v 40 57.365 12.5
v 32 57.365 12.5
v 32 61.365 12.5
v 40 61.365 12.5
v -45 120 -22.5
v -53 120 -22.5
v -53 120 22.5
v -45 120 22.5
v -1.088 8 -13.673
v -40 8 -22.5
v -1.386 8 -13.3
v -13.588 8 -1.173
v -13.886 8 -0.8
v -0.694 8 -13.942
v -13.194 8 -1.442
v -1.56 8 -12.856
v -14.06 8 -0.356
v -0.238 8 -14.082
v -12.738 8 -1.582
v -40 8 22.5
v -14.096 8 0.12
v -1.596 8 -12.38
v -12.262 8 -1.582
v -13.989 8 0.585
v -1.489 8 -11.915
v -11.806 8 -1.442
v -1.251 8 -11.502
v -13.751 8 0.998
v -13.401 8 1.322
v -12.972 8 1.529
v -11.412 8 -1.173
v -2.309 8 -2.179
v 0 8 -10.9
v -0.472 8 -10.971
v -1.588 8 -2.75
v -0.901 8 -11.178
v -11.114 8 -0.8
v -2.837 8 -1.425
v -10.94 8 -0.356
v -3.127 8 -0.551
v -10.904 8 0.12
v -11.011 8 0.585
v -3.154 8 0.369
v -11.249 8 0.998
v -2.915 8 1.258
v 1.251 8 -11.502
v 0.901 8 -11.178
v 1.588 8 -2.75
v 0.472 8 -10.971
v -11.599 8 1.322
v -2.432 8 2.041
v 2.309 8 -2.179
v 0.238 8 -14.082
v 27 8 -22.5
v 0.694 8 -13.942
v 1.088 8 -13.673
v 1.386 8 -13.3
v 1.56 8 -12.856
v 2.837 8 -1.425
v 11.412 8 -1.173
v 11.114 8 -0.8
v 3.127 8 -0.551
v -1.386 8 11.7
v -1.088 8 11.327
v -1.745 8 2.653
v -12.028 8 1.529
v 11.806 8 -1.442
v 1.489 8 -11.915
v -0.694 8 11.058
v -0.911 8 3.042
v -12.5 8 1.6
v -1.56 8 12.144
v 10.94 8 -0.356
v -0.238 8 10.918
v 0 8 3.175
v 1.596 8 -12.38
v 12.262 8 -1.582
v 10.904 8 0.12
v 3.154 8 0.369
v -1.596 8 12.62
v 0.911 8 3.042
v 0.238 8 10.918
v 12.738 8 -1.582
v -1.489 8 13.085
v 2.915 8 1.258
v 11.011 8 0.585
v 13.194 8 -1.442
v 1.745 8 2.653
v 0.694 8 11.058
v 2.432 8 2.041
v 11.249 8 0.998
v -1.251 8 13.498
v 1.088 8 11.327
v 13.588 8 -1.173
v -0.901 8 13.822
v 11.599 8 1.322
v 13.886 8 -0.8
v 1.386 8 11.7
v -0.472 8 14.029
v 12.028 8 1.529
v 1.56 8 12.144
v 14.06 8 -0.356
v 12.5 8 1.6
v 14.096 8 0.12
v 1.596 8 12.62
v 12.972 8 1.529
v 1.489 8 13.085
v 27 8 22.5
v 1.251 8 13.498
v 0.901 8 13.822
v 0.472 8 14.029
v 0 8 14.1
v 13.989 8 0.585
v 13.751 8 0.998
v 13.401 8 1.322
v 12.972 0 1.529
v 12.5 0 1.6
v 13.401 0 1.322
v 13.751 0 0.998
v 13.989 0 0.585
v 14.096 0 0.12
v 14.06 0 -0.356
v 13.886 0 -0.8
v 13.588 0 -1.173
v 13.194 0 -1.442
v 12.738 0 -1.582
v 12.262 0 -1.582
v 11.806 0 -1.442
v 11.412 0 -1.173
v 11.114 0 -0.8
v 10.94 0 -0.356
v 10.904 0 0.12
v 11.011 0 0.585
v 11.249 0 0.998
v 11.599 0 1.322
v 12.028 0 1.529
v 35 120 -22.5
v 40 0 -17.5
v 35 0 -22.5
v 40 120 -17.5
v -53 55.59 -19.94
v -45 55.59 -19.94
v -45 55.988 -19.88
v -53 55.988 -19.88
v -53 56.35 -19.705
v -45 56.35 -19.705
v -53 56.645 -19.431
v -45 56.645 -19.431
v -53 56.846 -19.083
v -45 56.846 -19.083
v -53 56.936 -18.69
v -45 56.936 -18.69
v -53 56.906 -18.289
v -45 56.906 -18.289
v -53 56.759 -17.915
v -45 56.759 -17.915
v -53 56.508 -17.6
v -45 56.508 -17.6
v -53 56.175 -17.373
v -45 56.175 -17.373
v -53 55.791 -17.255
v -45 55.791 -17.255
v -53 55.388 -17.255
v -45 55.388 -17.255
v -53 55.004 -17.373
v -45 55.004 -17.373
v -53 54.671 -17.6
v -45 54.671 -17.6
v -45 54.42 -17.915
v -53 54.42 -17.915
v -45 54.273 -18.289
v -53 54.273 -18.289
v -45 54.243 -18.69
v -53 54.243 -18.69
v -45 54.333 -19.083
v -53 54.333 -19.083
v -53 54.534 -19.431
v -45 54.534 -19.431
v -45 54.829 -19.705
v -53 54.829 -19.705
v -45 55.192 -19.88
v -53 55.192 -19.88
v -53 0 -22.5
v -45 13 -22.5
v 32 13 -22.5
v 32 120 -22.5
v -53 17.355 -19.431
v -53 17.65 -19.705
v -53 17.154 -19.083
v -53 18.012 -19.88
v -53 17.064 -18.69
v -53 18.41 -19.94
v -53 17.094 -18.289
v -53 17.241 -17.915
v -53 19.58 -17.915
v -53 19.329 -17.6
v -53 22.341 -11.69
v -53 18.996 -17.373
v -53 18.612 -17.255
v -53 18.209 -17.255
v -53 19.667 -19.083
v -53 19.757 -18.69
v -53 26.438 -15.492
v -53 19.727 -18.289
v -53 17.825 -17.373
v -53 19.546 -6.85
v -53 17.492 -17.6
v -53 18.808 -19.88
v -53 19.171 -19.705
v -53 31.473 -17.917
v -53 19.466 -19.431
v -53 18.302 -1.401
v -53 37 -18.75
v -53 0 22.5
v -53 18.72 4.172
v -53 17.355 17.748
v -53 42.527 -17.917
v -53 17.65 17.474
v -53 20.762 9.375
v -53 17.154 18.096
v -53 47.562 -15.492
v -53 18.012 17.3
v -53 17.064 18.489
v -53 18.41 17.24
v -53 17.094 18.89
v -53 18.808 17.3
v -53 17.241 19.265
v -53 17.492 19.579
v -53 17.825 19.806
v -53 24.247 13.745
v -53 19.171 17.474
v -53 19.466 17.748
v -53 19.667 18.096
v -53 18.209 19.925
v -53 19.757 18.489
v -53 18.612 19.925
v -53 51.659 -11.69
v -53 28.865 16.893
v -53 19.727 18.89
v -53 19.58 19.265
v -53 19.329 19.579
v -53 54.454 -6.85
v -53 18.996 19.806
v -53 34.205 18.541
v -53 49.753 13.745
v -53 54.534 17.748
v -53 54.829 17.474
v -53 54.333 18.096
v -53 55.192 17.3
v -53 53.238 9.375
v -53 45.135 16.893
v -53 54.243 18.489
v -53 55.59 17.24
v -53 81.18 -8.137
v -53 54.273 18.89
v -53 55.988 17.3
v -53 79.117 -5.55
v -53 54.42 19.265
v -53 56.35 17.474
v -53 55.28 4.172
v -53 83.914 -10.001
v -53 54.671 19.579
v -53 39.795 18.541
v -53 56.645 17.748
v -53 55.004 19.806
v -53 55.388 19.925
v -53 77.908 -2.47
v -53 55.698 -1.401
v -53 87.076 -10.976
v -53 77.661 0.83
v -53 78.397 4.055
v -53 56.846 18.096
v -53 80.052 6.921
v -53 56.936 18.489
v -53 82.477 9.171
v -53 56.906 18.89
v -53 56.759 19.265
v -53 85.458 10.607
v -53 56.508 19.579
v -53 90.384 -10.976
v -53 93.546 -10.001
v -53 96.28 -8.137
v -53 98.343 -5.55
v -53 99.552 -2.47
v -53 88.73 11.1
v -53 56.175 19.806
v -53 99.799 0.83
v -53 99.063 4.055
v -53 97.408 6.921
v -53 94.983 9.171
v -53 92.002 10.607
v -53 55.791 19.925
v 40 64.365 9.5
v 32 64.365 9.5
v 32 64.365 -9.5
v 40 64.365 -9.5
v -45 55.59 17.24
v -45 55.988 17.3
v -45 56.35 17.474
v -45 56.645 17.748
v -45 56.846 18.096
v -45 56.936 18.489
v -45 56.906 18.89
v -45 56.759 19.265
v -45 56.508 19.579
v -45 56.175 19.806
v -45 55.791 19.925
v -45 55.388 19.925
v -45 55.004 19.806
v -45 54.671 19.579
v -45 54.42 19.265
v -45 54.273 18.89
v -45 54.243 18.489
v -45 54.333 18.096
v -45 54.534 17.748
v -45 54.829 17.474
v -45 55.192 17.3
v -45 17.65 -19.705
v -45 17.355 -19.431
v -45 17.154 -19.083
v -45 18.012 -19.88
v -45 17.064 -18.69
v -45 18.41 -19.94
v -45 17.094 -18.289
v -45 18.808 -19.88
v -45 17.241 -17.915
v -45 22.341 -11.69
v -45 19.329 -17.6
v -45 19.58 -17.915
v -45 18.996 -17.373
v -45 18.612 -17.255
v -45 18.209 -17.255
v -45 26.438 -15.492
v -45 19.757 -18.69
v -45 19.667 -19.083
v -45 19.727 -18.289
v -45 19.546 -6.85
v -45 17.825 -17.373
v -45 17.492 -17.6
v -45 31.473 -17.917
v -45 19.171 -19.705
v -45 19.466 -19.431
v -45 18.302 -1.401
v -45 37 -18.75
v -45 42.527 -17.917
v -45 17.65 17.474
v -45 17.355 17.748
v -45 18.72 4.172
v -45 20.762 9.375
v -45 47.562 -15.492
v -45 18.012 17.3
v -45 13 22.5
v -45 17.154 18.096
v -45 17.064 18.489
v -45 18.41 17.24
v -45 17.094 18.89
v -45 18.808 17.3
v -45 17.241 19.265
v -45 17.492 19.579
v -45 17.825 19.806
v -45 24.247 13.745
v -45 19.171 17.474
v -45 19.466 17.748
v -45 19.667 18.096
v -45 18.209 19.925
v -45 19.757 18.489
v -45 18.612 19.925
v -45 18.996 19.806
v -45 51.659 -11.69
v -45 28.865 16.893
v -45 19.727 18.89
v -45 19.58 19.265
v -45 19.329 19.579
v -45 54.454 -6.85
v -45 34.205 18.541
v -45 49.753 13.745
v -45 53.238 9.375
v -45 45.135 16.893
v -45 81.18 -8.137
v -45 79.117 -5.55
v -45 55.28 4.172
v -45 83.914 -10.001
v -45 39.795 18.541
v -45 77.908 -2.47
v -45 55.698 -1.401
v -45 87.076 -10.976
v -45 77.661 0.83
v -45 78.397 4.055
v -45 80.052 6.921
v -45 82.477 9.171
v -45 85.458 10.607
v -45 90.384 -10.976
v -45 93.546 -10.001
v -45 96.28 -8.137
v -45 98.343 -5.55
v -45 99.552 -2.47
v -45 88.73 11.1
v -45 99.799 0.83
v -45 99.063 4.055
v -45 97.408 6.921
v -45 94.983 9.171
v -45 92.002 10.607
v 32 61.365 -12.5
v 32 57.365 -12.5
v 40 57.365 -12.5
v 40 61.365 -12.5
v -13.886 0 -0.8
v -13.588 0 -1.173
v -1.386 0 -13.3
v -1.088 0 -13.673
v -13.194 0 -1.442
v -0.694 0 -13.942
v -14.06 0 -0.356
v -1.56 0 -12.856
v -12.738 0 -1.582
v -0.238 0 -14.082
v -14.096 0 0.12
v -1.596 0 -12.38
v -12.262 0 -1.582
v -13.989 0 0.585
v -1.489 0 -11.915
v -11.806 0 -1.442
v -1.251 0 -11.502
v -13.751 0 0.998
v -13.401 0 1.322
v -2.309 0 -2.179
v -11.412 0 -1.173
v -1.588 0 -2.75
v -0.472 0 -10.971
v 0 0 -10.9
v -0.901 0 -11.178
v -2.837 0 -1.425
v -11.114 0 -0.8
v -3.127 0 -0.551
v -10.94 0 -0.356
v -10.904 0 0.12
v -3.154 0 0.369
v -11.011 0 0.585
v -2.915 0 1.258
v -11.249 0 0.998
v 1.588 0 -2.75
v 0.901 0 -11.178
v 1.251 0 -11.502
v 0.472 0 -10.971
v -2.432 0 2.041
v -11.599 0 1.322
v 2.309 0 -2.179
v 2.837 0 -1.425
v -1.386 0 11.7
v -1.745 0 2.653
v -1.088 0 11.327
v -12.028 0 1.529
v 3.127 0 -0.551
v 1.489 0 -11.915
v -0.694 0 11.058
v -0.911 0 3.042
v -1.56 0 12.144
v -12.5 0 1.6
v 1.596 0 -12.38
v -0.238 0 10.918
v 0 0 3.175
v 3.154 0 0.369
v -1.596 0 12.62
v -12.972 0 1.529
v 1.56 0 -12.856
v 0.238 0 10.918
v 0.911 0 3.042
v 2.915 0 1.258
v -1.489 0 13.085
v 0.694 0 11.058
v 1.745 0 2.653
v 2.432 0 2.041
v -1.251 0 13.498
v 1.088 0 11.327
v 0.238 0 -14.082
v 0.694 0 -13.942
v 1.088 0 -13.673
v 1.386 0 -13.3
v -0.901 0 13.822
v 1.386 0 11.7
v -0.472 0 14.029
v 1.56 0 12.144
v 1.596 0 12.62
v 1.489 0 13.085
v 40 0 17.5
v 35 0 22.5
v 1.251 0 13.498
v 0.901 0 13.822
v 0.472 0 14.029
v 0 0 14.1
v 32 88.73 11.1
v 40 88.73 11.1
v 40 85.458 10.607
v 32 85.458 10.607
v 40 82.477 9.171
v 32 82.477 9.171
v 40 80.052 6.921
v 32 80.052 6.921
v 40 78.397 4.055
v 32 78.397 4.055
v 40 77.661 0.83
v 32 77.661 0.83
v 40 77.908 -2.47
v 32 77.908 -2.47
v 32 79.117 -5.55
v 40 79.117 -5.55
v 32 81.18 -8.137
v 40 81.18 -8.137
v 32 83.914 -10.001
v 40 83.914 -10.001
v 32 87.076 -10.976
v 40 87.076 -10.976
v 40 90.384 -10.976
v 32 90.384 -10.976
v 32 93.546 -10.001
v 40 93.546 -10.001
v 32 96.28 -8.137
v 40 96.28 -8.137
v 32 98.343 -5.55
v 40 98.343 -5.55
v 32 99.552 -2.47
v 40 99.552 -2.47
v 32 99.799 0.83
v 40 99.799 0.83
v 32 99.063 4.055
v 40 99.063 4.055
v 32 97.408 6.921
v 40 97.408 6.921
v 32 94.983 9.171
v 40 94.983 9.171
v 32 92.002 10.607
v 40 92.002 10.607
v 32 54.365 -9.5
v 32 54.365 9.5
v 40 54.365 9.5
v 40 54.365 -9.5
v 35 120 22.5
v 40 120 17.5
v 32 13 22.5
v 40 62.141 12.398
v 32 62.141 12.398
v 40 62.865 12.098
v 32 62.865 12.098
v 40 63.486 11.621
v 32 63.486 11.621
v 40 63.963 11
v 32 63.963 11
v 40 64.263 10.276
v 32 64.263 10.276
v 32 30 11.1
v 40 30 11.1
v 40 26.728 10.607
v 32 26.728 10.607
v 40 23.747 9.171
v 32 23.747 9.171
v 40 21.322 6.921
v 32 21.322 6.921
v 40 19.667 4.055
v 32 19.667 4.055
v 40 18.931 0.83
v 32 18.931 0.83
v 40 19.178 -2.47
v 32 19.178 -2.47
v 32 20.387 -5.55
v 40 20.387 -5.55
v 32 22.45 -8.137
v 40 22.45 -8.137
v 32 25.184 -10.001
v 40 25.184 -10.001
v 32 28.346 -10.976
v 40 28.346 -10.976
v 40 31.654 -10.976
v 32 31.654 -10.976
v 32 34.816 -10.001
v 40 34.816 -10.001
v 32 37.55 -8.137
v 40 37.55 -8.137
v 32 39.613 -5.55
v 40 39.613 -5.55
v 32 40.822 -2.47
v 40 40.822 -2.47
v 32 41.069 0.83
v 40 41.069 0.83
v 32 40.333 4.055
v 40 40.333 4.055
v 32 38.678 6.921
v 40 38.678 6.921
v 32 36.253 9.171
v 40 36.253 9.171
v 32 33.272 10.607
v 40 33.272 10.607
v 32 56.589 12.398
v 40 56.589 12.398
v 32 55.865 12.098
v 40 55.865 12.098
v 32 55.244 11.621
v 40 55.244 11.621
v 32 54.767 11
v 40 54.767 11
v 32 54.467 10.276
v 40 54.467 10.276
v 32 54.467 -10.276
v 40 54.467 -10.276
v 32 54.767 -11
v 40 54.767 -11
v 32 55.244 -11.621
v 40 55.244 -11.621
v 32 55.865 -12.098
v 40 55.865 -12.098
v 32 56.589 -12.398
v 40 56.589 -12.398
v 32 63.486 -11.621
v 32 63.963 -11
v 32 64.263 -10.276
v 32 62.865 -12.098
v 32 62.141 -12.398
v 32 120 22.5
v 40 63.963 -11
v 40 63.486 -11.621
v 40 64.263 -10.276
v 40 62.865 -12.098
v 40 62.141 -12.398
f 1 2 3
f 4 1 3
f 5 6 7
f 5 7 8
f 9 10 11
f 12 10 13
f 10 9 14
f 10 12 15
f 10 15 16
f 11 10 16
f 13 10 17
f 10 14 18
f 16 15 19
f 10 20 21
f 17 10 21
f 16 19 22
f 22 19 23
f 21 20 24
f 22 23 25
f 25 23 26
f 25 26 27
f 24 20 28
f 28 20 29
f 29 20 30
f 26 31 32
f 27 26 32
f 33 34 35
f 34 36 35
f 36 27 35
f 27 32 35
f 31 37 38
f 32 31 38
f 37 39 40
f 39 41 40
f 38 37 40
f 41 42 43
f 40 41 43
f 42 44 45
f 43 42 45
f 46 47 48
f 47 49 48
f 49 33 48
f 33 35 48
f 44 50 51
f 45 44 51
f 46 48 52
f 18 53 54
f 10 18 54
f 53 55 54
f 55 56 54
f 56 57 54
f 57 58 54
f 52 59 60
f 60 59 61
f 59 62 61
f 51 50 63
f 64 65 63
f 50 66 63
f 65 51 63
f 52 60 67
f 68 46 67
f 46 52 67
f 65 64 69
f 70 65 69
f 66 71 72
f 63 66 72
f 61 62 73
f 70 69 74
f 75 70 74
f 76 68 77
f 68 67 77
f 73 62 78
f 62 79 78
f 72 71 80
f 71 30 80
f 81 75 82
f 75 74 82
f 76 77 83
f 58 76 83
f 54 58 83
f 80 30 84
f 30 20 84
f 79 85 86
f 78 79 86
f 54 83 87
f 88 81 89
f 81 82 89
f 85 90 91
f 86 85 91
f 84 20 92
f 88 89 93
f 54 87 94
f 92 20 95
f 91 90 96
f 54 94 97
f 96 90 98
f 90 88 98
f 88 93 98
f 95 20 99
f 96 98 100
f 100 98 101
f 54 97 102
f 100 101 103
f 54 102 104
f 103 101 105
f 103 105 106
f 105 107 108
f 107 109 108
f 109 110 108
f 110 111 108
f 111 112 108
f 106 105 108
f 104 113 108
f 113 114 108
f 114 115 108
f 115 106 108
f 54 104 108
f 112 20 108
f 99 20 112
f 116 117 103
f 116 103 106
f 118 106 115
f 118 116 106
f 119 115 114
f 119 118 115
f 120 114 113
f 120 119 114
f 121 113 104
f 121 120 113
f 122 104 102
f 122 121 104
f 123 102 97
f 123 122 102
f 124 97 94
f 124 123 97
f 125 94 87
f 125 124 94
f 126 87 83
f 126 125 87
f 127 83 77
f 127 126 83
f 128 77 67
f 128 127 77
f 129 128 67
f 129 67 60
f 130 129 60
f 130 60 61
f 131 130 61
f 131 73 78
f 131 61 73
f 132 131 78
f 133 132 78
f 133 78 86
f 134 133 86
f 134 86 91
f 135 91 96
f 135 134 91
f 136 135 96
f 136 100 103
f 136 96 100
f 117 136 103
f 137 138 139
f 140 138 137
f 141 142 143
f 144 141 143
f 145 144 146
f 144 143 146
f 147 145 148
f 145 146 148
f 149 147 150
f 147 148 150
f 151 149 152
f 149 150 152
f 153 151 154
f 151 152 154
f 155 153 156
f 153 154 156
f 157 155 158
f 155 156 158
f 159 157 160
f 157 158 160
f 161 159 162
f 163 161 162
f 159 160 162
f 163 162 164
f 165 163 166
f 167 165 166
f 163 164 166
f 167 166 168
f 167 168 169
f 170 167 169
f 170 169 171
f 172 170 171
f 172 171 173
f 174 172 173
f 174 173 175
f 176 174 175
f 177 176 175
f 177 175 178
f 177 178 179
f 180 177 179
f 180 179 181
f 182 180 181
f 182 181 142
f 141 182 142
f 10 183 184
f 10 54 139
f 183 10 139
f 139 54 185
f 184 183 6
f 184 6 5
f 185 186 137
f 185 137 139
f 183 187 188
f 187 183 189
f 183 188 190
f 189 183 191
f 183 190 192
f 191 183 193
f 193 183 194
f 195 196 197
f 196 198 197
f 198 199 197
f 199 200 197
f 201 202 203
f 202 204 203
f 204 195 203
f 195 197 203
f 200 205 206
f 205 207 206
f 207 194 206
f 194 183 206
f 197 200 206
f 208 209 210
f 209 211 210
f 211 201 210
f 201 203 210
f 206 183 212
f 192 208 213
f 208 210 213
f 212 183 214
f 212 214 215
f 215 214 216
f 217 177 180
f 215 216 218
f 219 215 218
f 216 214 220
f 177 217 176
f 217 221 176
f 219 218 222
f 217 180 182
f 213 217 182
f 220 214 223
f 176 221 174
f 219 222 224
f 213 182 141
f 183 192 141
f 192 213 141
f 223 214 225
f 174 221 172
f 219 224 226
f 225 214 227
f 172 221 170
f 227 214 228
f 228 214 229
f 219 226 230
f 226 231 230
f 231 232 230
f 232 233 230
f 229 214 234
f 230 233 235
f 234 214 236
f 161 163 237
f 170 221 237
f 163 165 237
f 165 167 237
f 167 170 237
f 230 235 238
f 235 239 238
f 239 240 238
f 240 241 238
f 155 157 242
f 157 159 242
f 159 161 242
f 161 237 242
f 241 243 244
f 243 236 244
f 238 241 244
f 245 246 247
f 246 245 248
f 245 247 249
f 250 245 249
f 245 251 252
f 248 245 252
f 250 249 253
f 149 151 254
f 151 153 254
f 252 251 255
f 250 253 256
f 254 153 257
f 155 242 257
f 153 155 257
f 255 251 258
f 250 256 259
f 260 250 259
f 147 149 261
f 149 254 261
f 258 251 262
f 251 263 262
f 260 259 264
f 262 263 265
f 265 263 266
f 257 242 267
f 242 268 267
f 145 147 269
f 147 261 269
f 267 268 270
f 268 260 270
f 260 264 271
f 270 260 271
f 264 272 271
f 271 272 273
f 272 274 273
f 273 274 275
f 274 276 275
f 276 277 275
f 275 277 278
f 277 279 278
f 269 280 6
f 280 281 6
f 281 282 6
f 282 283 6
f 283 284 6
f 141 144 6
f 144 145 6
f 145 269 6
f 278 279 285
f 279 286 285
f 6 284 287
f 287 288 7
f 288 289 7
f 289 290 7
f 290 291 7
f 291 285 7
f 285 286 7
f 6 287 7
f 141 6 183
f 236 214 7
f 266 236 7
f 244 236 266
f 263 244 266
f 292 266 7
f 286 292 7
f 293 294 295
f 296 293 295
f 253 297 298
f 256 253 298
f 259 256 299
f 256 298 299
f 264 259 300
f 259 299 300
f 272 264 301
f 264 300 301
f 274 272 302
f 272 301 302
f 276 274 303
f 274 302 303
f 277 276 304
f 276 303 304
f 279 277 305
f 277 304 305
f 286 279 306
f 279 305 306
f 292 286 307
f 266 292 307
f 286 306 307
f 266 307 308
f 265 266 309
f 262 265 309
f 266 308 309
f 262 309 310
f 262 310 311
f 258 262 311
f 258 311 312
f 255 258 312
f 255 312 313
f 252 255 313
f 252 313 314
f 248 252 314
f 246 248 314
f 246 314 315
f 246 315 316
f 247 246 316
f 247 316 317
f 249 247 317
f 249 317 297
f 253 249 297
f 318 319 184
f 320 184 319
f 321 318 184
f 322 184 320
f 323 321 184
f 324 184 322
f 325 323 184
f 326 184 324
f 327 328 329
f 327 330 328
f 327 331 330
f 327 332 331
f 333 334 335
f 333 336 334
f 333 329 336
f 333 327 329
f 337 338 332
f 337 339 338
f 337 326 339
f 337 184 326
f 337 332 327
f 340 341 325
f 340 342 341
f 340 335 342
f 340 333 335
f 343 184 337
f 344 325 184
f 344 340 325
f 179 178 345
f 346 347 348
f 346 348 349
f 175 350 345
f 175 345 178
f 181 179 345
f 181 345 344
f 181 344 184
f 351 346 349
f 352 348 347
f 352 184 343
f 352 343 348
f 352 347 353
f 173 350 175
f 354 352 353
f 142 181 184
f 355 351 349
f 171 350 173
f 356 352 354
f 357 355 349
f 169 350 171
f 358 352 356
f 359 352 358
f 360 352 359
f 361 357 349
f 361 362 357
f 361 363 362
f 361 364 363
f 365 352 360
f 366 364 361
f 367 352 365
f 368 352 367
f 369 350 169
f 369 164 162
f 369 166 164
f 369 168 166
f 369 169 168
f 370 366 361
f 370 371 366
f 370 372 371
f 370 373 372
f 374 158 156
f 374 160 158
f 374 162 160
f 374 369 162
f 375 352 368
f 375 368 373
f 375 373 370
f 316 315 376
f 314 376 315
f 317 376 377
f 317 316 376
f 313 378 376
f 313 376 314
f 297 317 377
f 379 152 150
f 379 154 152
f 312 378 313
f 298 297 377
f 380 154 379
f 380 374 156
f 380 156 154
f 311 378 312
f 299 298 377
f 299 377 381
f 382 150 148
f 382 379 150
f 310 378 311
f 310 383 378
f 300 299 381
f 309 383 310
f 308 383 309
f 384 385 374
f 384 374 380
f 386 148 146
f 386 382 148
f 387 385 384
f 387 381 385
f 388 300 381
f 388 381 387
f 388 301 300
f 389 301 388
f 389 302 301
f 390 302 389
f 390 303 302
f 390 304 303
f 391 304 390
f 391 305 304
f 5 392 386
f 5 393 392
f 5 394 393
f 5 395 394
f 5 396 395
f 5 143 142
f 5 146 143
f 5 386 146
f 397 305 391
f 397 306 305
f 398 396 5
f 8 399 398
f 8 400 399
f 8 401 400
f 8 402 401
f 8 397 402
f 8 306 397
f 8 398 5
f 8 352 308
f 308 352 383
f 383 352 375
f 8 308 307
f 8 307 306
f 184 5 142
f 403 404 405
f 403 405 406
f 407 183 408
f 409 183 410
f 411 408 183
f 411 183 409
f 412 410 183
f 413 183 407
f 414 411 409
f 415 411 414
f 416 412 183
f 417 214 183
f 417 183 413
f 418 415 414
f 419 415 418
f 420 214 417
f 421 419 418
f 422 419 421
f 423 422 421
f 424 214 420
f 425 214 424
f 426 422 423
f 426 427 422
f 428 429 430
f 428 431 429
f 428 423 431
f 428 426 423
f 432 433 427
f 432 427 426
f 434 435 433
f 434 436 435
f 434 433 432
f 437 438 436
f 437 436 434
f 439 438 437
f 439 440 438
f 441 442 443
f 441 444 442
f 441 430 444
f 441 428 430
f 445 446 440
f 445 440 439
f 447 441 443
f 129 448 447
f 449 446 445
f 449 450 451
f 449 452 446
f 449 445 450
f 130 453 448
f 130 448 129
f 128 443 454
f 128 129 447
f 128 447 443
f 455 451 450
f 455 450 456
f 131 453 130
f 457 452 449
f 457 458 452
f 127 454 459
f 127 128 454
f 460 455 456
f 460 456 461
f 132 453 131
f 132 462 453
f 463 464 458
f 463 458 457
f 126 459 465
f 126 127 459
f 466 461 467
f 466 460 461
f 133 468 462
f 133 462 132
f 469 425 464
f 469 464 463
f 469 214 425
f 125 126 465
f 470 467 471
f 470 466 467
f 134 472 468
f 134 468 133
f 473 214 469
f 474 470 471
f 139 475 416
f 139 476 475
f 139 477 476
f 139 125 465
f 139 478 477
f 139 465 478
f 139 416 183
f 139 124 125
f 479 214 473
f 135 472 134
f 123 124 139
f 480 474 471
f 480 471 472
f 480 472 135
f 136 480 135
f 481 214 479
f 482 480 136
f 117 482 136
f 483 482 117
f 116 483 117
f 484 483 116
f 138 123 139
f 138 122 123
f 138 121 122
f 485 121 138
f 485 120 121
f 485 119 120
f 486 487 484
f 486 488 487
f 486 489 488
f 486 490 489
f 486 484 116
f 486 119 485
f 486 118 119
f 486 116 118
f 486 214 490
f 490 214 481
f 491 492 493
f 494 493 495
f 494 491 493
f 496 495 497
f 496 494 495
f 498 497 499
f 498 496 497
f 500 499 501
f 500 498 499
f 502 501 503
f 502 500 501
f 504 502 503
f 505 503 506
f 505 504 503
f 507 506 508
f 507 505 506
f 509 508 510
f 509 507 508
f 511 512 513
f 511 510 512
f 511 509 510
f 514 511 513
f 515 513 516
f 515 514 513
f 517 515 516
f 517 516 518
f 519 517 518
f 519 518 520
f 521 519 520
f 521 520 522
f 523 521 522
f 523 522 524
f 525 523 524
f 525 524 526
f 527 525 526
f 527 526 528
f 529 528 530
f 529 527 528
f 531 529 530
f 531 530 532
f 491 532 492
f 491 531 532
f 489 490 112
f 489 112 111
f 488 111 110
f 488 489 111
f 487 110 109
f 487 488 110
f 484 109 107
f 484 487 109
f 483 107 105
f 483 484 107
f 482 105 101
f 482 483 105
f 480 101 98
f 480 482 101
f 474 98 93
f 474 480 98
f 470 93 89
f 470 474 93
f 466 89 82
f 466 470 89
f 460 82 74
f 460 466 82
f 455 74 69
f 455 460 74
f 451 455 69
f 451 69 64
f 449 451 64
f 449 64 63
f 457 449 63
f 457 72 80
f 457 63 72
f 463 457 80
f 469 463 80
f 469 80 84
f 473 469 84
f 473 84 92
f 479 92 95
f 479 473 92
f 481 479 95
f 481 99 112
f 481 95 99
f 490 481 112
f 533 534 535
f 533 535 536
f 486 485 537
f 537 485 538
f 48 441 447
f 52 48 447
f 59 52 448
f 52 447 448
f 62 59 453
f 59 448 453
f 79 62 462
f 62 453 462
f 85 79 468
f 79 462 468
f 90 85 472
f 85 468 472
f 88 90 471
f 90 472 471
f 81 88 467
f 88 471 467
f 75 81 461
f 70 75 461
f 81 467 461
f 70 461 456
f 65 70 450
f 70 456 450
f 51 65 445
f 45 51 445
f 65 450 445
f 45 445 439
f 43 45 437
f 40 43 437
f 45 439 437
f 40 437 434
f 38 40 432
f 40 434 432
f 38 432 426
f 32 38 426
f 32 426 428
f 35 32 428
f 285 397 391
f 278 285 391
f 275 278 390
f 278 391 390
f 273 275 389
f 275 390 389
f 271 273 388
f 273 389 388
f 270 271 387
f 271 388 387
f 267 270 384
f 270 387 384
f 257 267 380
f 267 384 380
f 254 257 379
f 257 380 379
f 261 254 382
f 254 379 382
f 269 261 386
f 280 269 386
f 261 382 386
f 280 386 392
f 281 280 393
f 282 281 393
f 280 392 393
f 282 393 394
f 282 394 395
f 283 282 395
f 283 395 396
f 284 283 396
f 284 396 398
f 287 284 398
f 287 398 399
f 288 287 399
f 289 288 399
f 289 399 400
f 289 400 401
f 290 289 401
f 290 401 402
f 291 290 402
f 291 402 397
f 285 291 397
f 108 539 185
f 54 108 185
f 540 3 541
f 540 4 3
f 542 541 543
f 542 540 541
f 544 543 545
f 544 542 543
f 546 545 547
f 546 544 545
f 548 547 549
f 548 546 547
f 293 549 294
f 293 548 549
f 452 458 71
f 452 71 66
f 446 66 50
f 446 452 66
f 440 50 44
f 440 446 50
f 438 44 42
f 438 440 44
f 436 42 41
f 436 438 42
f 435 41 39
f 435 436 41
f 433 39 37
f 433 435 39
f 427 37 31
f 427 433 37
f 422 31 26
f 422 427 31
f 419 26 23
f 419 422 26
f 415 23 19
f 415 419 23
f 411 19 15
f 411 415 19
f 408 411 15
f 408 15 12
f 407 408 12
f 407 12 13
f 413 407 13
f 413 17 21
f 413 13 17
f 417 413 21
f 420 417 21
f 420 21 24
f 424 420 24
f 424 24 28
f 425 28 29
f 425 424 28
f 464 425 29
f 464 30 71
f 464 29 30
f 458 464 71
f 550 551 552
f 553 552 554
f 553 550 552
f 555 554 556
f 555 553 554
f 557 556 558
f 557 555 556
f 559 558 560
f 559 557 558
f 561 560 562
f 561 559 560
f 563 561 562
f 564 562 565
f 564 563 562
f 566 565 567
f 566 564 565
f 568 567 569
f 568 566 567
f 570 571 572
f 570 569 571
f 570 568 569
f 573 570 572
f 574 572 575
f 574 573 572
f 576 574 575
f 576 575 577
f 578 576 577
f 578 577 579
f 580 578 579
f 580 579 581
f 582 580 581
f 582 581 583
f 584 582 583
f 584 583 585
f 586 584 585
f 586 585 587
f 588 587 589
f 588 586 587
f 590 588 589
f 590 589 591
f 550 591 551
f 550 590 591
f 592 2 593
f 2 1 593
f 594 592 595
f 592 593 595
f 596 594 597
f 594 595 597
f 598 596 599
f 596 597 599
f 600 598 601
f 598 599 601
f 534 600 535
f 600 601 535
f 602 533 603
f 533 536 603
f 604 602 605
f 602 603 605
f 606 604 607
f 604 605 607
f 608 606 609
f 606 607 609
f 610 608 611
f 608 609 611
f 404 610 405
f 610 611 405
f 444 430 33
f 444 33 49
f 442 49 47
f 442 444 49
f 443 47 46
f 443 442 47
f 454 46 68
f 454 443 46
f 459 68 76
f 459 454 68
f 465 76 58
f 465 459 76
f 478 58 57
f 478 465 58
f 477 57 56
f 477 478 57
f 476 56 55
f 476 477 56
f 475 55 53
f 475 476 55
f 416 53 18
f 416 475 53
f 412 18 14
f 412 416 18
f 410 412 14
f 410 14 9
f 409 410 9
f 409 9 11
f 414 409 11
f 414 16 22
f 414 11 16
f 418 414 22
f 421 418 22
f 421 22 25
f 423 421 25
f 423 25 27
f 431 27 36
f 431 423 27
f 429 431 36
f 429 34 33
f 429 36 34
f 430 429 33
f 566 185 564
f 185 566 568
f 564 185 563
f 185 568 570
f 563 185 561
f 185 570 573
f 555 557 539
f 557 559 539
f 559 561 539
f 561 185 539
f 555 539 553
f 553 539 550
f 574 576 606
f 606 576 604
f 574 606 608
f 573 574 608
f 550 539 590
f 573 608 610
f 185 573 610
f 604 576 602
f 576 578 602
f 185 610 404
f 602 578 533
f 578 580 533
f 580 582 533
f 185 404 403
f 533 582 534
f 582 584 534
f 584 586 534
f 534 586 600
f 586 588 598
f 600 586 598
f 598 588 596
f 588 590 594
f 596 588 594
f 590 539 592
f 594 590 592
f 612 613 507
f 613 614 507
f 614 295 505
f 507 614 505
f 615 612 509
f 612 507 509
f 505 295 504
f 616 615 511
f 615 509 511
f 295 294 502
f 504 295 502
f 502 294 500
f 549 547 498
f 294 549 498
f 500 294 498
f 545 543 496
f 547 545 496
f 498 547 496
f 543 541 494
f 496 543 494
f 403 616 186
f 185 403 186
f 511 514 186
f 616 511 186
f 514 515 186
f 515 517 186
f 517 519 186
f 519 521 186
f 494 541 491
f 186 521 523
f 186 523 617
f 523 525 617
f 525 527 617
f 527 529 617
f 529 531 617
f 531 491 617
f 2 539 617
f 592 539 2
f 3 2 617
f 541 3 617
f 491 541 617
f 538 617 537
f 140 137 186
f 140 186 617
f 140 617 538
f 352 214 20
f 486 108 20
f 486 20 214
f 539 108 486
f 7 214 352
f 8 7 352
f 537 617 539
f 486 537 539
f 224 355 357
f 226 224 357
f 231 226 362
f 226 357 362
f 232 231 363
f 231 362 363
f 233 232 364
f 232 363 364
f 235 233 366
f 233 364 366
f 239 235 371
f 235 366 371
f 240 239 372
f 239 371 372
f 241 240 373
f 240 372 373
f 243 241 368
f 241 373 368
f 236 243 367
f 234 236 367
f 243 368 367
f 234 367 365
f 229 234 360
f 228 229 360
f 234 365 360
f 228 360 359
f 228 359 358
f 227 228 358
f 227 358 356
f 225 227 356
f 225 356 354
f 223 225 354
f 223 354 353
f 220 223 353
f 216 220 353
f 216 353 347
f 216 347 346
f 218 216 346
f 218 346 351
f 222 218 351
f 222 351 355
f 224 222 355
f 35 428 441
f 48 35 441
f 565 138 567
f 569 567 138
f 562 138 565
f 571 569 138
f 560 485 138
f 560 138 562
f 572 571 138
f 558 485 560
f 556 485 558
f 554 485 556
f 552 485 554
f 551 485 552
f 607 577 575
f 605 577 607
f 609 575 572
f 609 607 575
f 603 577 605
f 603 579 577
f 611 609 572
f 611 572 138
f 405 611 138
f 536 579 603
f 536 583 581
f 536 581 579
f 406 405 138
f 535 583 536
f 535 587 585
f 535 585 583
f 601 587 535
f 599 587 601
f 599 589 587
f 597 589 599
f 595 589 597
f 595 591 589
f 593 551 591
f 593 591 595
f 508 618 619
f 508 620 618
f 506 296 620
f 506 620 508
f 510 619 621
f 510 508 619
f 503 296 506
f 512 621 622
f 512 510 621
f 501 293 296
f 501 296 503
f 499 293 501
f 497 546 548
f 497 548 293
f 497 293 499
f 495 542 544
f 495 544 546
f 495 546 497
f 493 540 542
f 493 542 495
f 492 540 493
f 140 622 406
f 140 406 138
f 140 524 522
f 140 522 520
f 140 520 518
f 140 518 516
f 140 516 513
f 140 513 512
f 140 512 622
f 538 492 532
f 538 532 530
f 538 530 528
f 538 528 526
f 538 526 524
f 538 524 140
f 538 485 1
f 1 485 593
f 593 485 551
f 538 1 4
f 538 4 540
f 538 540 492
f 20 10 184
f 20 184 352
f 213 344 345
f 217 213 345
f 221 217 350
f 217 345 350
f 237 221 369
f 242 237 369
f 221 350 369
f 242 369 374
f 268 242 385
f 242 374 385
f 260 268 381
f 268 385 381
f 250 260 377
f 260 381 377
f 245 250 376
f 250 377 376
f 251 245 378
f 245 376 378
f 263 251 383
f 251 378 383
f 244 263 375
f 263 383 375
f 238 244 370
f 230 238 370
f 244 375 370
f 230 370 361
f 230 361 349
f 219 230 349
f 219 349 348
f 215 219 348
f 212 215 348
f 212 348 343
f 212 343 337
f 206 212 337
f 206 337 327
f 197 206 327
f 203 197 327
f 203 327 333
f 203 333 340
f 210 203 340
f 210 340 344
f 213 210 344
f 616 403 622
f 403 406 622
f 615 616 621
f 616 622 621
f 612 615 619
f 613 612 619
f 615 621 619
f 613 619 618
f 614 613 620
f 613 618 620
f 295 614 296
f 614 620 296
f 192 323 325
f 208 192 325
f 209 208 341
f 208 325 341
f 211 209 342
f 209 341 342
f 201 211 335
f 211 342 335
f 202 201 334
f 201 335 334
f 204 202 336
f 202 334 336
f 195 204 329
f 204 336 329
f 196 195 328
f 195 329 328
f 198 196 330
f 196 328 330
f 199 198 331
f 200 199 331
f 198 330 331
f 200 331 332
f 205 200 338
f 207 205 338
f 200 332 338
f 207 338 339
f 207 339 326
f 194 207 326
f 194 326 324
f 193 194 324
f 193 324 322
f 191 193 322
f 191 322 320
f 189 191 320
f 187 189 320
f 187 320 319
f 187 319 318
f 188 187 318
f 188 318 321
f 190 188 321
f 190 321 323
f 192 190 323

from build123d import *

# Parameters (mm, degrees)
SKETCH1_W               = 93
SKETCH1_H               = 130
SKETCH1_W_2             = 77
SKETCH1_H_2             = 114
BOSS_EXTRUDE1_DEPTH     = 22.5
CUT_EXTRUDE1_START      = 32
SKETCH2_R               = 11.1
CUT_EXTRUDE1_DEPTH      = 111.180343226
CUT_EXTRUDE2_START      = -45
SKETCH3_R               = 11.1
SKETCH3_R_2             = 18.75
CUT_EXTRUDE2_DEPTH      = 98.180343226
CUT_EXTRUDE3_DEPTH      = 143.180343226
CUT_EXTRUDE3_DEPTH_BACK = 143.180343226
SKETCH4_R               = 1.6
CUT_EXTRUDE4_START      = -45
SKETCH5_R               = 1.35
CUT_EXTRUDE4_DEPTH      = 98.180343226
CHAMFER1_SIZE           = 5
CUT_EXTRUDE5_DEPTH      = 143.180343226
CUT_EXTRUDE5_DEPTH_BACK = 143.180343226
SKETCH6_W               = 106
SKETCH6_H               = 10
CHAMFER2_SIZE           = 5
SKETCH11_W              = 25
SKETCH11_H              = 10
CUT_EXTRUDE7_DEPTH      = 134.098647626
FILLET2_R               = 3


with BuildPart() as part:
    # Sketch1 → Boss-Extrude1 (new, symmetric)
    with BuildSketch(Plane.XY):
        with Locations((-6.5, 65)):
            Rectangle(SKETCH1_W, SKETCH1_H)
        with Locations((-6.5, 65)):
            Rectangle(SKETCH1_W_2, SKETCH1_H_2, mode=Mode.SUBTRACT)
    extrude(amount=BOSS_EXTRUDE1_DEPTH, both=True)

    # Sketch2 → Cut-Extrude1 (cut, through all)
    with BuildSketch(Plane(origin=(0, 0, 0), x_dir=(0, 0, -1), z_dir=(1, 0, 0)).offset(CUT_EXTRUDE1_START)):
        with Locations(Location((0, 88.73, 0), (0, 0, 180))):
            Circle(SKETCH2_R)
        with Locations(Location((0, 30, 0), (0, 0, 180))):
            Circle(SKETCH2_R)
    extrude(amount=CUT_EXTRUDE1_DEPTH, mode=Mode.SUBTRACT)

    # Sketch3 → Cut-Extrude2 (cut, through all)
    with BuildSketch(Plane(origin=(0, 0, 0), x_dir=(0, 0, -1), z_dir=(1, 0, 0)).offset(CUT_EXTRUDE2_START)):
        with Locations(Location((0, 88.73, 0), (0, 0, 180))):
            Circle(SKETCH3_R)
        with Locations((0, 37)):
            Circle(SKETCH3_R_2)
    extrude(amount=-CUT_EXTRUDE2_DEPTH, mode=Mode.SUBTRACT)

    # Sketch4 → Cut-Extrude3 (cut, two sides: drawn at the far end of the back side and taken through both)
    with BuildSketch(Plane(origin=(0, 0, 0), x_dir=(1, 0, 0), z_dir=(0, 1, 0)).offset(-CUT_EXTRUDE3_DEPTH_BACK)):
        with Locations(Location((-12.5, 0, 0), (0, 0, 270))):
            Circle(SKETCH4_R)
        with Locations(Location((0, 12.5, 0), (0, 0, 270))):
            Circle(SKETCH4_R)
        with Locations(Location((12.5, 0, 0), (0, 0, 270))):
            Circle(SKETCH4_R)
        with Locations(Location((0, -12.5, 0), (0, 0, 270))):
            Circle(SKETCH4_R)
        with BuildLine():
            Line((-1.5875, 2.749630657), (1.5875, 2.749630657))
            ThreePointArc((1.5875, 2.749630657), (0, -3.175), (-1.5875, 2.749630657))
        make_face()
    extrude(amount=CUT_EXTRUDE3_DEPTH + CUT_EXTRUDE3_DEPTH_BACK, mode=Mode.SUBTRACT)

    # Sketch5 → Cut-Extrude4 (cut, through all)
    with BuildSketch(Plane(origin=(0, 0, 0), x_dir=(0, 0, -1), z_dir=(1, 0, 0)).offset(CUT_EXTRUDE4_START)):
        with Locations((18.589603123, 18.410396877)):
            Circle(SKETCH5_R)
        with Locations((-18.589603123, 18.410396877)):
            Circle(SKETCH5_R)
        with Locations((-18.589603123, 55.589603123)):
            Circle(SKETCH5_R)
        with Locations((18.589603123, 55.589603123)):
            Circle(SKETCH5_R)
    extrude(amount=-CUT_EXTRUDE4_DEPTH, mode=Mode.SUBTRACT)

    # Chamfer1
    chamfer1_edges = [part.edges().sort_by_distance(p)[0] for p in [
        (40, 65, 22.5),
        (40, 65, -22.5),
    ]]
    chamfer(chamfer1_edges, length=CHAMFER1_SIZE)

    # Sketch6 → Cut-Extrude5 (cut, two sides: drawn at the far end of the back side and taken through both)
    with BuildSketch(Plane.XY.offset(-CUT_EXTRUDE5_DEPTH_BACK)):
        with Locations((0, 125)):
            Rectangle(SKETCH6_W, SKETCH6_H)
    extrude(amount=CUT_EXTRUDE5_DEPTH + CUT_EXTRUDE5_DEPTH_BACK, mode=Mode.SUBTRACT)

    # Chamfer2
    chamfer2_edges = [part.edges().sort_by_distance(p)[0] for p in [
        (-45, 8, 0),
        (32, 8, 0),
    ]]
    chamfer(chamfer2_edges, length=CHAMFER2_SIZE)

    # Sketch11 → Cut-Extrude7 (cut, through all)
    with BuildSketch(Plane(origin=(0, 0, 0), x_dir=(0, 0, -1), z_dir=(1, 0, 0))):
        with Locations((0, 59.365)):
            Rectangle(SKETCH11_W, SKETCH11_H)
    extrude(amount=CUT_EXTRUDE7_DEPTH, mode=Mode.SUBTRACT)

    # Fillet2
    fillet2_edges = [part.edges().sort_by_distance(p)[0] for p in [
        (36, 54.365, -12.5),
        (36, 64.365, -12.5),
        (36, 64.365, 12.5),
        (36, 54.365, 12.5),
    ]]
    fillet(fillet2_edges, radius=FILLET2_R)


solid = part.part
